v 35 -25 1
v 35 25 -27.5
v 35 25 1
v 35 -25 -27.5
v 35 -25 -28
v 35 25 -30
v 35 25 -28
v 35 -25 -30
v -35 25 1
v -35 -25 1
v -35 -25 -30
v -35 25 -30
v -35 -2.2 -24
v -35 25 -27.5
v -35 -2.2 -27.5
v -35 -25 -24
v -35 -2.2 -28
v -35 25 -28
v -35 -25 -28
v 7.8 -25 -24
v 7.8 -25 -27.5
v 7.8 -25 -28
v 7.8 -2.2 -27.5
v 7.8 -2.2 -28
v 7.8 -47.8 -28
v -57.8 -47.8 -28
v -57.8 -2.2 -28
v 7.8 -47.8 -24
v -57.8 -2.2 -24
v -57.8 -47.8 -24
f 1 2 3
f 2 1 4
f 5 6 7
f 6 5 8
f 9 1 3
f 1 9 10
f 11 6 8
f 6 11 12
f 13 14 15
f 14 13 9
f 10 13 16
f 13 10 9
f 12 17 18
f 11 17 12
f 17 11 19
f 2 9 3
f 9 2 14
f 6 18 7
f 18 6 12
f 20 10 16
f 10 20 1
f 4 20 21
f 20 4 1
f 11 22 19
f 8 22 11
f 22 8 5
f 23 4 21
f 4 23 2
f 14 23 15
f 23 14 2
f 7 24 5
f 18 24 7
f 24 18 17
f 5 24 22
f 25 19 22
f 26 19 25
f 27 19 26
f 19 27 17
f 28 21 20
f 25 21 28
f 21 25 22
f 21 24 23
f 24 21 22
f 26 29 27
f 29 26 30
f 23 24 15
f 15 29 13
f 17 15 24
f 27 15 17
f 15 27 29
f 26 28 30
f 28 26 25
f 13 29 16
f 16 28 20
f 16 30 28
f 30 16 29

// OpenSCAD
// Two-part enclosure for a small electronics board (e.g. Arduino-based logger)
// Print orientation: box on the bed (z = 0), lid on top, side by side along X

// ---------------- Parameters ----------------
box_x      = 70;    // box outer length (X)
box_y      = 50;    // box outer width (Y)
box_z      = 30;    // box outer height (Z)
box_wall   = 2;     // box wall thickness
box_floor  = 2;     // box floor thickness

lip_x      = 65.6;  // lid lip outer length (X)
lip_y      = 45.6;  // lid lip outer width (Y)
lip_t      = 1.5;   // lid lip thickness
lip_h      = 4;     // lid lip height (from plate top)

gap        = 10;    // gap between box and lid
eps        = 0.5;   // cutter overshoot past faces

$fn = 64;

// ---------------- Derived ----------------
box_x0 = -box_x / 2;
box_y0 = -box_y / 2;
box_z0 = -box_z;                    // outer bottom (z = -30)
floor_z = box_z0 + box_floor;       // z = -28

lip_x0 = -lip_x / 2;
lip_y0 = -lip_y / 2;
lip_top_z = floor_z + lip_t;        // z = -26.5

// ---------------- Model ----------------
union() {
    // Box: open-top, walls on all sides
    difference() {
        translate([box_x0, box_y0, box_z0])
            cube([box_x, box_y, box_z + 1]);   // extends past top face
        translate([box_x0, box_y0, floor_z])
            cube([box_x, box_y, eps]);        // floor cutter
    }

    // Lid: plate with a rectangular lip on top, centred on the box
    translate([box_x0 + gap, box_y0, floor_z]) {
        // Plate
        translate([-lip_x / 2, -lip_y / 2, 0])
            cube([lip_x, lip_y, lip_t]);

        // Lip (overhangs the plate; would need supports if printed this way)
        translate([-lip_x / 2, -lip_y / 2, 0])
            cube([lip_x, lip_y, lip_h]);
    }
}
